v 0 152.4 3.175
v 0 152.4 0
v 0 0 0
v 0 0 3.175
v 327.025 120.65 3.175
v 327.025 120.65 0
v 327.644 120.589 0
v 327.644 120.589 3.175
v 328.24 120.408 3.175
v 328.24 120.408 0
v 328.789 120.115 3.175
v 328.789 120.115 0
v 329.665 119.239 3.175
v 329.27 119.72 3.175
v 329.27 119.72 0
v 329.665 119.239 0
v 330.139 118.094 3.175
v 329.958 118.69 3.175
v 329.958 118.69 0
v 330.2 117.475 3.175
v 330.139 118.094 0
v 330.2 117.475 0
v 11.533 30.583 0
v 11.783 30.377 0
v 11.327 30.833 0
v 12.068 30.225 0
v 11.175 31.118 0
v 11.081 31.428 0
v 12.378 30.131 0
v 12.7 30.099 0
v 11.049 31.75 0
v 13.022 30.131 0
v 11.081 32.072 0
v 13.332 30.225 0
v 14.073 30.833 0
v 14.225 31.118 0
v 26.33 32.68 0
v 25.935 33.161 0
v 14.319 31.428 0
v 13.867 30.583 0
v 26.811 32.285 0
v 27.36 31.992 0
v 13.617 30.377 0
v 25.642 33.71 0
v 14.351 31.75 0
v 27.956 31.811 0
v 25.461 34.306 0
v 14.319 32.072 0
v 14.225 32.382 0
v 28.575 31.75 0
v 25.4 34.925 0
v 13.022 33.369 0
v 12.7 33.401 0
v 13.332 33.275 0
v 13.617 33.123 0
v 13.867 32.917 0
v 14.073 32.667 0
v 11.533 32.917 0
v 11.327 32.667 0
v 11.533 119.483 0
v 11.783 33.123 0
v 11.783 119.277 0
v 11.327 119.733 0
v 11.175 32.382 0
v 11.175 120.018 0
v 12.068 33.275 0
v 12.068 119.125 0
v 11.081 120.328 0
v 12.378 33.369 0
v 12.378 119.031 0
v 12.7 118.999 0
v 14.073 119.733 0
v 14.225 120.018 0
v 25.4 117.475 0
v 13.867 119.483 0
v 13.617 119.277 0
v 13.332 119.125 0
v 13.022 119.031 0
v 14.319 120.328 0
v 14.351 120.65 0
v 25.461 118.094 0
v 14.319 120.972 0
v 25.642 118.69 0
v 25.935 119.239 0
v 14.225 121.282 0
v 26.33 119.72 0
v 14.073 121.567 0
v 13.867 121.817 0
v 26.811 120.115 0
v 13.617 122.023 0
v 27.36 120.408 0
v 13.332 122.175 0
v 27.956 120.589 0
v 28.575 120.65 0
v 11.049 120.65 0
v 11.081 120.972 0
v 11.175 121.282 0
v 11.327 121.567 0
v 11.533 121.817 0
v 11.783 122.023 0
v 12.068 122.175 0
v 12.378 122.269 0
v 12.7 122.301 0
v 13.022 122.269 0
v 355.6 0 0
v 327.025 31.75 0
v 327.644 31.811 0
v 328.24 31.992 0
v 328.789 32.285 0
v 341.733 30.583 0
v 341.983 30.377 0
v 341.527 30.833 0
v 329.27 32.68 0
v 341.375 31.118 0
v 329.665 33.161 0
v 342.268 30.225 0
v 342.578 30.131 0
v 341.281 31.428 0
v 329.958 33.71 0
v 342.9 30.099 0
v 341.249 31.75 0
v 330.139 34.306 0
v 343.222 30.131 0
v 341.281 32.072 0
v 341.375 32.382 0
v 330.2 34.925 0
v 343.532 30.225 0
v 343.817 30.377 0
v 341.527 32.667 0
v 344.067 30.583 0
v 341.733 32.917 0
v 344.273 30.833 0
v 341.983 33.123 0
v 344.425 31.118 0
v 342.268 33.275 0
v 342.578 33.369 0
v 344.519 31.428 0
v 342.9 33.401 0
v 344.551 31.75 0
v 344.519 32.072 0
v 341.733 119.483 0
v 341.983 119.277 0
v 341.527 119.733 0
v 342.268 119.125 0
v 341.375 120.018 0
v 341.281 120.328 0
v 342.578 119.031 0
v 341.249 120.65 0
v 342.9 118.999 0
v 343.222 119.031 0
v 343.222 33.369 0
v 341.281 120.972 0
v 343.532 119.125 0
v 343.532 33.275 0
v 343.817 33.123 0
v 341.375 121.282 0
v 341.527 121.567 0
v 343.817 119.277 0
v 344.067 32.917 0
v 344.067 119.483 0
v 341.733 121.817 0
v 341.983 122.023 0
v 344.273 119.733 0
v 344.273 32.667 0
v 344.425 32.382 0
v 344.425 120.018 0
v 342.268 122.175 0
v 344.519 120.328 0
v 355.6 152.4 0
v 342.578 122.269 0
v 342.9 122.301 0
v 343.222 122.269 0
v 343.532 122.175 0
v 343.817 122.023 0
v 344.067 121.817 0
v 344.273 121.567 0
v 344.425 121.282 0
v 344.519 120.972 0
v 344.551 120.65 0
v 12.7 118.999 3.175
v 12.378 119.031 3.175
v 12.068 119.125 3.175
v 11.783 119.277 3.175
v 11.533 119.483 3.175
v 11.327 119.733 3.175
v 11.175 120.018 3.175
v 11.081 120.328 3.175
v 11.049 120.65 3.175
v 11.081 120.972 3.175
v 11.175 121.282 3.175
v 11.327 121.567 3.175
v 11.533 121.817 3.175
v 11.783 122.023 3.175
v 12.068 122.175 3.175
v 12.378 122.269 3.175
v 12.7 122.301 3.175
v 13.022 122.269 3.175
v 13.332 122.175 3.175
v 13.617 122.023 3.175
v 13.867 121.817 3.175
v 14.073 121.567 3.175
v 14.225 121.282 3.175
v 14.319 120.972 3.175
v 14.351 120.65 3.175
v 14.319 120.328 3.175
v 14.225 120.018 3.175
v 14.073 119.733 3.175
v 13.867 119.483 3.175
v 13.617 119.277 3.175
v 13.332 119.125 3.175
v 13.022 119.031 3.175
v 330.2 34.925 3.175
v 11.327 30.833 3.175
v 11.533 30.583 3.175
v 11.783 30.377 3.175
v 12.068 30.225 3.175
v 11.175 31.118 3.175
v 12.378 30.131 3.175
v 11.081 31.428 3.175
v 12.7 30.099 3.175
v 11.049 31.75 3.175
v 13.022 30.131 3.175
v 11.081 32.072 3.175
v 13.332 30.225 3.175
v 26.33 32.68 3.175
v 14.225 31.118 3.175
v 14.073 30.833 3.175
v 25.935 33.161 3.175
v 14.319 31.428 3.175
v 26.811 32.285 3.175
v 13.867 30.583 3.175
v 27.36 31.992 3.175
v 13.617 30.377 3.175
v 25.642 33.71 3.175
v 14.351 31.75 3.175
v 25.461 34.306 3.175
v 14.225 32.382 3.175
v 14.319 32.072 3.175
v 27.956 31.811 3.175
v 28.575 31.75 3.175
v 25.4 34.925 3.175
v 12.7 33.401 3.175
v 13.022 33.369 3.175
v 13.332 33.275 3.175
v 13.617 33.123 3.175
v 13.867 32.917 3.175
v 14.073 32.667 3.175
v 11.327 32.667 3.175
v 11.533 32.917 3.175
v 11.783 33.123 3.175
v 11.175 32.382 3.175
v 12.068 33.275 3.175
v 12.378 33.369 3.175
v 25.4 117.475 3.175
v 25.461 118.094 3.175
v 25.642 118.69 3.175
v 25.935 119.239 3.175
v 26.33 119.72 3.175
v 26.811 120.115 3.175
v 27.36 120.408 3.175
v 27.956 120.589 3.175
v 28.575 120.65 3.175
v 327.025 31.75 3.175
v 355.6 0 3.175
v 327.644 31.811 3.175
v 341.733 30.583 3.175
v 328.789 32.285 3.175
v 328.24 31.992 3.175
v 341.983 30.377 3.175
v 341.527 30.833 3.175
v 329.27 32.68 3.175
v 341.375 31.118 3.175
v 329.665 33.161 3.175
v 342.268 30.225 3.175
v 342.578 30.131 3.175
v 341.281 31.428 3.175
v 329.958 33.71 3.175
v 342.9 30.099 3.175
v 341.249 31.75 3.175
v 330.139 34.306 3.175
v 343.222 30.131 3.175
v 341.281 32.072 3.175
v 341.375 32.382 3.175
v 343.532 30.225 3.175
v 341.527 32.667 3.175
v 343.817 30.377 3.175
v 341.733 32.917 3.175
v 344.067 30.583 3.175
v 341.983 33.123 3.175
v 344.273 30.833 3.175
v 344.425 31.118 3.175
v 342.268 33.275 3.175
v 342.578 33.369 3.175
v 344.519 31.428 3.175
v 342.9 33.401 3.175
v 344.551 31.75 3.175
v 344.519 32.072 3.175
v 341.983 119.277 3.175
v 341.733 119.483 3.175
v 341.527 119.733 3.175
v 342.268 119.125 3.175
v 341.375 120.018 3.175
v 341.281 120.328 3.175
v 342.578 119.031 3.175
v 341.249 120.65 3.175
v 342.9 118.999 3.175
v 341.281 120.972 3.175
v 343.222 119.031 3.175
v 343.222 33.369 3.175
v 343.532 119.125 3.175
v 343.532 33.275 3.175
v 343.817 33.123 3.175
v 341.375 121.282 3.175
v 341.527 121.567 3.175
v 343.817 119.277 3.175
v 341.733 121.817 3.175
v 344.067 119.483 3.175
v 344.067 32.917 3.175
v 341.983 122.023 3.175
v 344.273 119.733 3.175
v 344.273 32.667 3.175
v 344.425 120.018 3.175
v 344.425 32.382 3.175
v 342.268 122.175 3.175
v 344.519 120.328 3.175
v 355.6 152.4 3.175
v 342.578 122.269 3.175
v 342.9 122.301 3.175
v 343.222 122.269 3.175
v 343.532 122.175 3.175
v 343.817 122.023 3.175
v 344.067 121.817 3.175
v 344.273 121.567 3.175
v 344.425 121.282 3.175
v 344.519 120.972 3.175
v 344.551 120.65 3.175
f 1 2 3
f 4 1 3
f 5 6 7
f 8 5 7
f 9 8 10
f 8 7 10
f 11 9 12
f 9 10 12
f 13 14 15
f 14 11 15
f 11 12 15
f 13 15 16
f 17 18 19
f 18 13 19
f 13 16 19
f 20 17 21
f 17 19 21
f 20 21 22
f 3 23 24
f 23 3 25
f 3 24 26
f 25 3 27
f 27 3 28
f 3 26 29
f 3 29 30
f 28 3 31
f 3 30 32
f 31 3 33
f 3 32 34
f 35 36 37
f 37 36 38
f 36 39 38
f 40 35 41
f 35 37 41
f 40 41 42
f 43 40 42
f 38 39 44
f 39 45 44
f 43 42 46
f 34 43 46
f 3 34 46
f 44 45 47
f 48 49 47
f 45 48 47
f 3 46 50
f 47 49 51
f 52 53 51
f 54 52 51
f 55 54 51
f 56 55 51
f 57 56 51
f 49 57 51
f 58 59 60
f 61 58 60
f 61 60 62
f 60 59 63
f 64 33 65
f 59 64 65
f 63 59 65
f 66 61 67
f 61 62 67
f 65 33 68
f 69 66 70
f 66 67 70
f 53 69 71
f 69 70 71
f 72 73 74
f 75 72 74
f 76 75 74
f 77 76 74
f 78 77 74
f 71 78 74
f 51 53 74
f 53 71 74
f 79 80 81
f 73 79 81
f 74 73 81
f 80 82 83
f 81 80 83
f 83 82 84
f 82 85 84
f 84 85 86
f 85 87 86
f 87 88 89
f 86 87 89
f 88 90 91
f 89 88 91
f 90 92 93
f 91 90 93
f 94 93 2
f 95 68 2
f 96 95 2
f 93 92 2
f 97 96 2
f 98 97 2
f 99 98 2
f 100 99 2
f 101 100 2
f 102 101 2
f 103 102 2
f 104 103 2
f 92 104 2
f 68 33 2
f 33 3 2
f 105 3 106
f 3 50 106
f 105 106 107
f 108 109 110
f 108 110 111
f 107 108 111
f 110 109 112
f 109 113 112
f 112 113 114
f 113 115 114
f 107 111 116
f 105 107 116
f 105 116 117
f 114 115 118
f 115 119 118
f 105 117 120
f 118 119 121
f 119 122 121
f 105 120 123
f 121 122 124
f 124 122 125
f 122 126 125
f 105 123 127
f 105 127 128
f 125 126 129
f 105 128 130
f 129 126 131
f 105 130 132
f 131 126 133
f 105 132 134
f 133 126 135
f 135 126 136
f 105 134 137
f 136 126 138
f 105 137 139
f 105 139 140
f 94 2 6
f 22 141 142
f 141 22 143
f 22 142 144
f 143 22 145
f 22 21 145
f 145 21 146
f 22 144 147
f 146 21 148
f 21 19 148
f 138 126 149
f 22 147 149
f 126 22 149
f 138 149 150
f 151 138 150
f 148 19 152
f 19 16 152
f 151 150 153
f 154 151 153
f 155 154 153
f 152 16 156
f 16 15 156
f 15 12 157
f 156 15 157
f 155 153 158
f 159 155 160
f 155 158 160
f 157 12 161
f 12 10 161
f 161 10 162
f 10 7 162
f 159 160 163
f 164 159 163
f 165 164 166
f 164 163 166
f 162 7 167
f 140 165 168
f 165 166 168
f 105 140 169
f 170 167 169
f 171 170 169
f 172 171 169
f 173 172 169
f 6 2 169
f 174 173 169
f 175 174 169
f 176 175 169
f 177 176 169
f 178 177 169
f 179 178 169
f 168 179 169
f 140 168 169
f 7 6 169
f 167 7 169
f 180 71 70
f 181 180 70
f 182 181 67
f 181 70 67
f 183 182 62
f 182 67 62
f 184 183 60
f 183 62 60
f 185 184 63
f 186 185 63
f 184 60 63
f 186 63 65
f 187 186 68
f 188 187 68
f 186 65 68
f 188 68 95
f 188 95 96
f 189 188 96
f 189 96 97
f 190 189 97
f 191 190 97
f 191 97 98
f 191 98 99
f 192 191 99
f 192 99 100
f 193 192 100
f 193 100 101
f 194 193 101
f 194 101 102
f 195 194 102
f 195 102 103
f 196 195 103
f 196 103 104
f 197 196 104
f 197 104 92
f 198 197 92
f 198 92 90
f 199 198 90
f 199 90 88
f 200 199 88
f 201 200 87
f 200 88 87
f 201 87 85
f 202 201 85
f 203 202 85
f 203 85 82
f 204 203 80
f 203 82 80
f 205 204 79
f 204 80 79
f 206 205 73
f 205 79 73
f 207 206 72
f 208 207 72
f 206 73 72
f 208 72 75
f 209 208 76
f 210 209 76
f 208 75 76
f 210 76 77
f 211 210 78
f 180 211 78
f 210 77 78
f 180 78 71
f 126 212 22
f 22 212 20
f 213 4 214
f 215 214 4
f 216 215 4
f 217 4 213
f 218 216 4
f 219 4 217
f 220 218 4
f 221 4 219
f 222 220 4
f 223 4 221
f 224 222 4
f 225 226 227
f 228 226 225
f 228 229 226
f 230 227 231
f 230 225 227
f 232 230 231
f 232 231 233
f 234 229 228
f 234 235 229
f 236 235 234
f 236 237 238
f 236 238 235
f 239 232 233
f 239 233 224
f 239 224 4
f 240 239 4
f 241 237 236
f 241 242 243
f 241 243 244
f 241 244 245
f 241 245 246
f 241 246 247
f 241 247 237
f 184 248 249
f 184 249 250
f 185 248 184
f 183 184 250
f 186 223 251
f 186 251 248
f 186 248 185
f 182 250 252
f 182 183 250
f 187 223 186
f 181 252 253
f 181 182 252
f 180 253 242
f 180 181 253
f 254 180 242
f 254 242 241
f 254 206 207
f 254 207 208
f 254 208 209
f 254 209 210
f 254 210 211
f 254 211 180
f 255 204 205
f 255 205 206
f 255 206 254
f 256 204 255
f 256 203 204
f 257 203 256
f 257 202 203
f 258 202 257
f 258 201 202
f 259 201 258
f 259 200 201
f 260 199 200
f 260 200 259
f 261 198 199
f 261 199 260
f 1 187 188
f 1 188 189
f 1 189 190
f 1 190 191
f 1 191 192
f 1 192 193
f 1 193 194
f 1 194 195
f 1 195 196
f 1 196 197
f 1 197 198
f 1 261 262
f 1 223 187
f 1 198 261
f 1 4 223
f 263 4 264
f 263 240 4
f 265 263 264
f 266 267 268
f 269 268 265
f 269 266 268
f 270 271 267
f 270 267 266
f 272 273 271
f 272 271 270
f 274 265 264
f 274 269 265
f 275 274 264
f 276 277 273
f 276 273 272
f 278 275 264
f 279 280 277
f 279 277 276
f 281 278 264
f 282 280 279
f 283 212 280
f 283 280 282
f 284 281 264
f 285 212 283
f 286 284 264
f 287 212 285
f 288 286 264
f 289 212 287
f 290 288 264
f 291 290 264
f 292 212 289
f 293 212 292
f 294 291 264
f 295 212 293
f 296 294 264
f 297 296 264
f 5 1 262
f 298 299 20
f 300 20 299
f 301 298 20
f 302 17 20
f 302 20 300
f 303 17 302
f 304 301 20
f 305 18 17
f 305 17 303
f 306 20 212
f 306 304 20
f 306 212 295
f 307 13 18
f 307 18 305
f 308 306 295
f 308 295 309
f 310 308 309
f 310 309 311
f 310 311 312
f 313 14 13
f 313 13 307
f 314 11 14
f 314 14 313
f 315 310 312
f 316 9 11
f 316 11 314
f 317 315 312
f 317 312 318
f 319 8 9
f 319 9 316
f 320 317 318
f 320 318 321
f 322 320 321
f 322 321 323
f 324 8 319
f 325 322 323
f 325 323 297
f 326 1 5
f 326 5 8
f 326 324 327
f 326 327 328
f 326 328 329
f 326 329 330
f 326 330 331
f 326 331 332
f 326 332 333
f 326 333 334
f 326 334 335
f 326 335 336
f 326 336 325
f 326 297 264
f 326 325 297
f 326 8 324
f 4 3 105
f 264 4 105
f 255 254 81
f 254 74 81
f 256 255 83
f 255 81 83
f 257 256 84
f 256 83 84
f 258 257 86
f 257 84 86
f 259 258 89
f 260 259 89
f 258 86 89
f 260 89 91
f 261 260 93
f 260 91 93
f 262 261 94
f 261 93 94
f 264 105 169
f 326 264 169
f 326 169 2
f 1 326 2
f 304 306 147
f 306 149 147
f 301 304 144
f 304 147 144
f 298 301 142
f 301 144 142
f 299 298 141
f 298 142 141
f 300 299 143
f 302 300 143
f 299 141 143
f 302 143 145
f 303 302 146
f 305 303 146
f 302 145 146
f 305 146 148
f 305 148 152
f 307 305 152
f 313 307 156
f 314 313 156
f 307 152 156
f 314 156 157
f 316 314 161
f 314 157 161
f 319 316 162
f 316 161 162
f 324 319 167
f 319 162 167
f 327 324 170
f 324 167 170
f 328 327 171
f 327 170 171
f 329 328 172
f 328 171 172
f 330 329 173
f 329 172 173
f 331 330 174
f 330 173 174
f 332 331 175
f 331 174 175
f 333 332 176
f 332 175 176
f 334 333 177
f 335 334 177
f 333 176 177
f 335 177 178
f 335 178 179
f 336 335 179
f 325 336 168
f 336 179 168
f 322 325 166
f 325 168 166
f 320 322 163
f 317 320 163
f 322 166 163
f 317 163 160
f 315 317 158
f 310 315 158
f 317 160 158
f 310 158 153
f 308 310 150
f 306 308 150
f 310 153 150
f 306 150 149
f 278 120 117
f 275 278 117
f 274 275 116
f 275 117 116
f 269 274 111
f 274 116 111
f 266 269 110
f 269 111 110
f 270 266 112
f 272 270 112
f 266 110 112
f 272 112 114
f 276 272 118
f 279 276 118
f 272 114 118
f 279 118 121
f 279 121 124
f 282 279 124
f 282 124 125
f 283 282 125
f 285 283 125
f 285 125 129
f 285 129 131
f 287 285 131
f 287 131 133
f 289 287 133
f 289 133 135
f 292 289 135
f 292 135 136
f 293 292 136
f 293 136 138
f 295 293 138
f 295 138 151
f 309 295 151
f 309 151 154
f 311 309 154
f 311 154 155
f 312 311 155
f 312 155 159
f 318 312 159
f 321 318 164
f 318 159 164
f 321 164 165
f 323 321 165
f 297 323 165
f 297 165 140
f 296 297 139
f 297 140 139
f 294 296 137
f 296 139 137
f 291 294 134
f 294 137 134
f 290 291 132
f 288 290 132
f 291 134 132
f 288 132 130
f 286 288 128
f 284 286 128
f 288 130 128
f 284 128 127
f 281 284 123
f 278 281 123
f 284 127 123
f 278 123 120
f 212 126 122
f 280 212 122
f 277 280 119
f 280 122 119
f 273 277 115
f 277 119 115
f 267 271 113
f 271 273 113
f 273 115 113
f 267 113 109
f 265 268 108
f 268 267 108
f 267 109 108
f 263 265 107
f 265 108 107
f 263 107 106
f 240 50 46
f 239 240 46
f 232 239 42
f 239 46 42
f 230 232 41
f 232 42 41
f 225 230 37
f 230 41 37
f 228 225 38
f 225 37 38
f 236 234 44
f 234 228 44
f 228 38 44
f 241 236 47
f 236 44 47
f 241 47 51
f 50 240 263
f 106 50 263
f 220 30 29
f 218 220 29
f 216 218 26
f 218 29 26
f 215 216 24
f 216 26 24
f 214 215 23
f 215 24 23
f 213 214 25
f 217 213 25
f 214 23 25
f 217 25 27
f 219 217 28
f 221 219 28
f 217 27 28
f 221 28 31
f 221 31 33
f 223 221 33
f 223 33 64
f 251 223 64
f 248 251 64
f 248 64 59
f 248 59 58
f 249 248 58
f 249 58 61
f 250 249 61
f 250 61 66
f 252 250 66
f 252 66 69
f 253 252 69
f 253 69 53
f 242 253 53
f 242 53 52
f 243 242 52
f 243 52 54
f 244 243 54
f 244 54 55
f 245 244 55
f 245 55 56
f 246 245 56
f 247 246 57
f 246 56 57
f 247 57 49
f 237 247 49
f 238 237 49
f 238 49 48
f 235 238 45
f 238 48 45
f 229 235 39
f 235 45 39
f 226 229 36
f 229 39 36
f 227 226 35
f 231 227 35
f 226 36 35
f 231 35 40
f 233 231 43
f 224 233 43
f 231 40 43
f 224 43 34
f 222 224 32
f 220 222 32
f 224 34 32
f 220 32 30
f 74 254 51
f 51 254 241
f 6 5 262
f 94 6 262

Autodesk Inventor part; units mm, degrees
ref_plane "YZ Plane" through (0, 0, 0) normal (1, 0, 0) x (0, 1, 0)
ref_plane "XZ Plane" through (0, 0, 0) normal (0, 1, 0) x (-1, 0, 0)
ref_plane "XY Plane" through (0, 0, 0) normal (0, 0, 1) x (1, 0, 0)
sketch "Sketch1" plane through (0, 0, 0) normal (0, 0, 1) x (1, 0, 0)
  line L0 (0, 0) -> (355.6, 0)
  line L1 (355.6, 0) -> (355.6, 152.4)
  line L2 (355.6, 152.4) -> (0, 152.4)
  line L3 (0, 152.4) -> (0, 0)
  dimension "d0" = 152.4
  dimension "d1" = 355.6
extrude "Extrusion1" add sketch "Sketch1" along normal blind 3.175
sketch "Sketch2" plane through (0, 0, 3.175) normal (0, 0, 1) x (1, 0, 0)
  line L0 (355.6, 0) -> (355.6, 152.4) projected
  line L1 (0, 152.4) -> (0, 0) projected
  line L2 (355.6, 152.4) -> (0, 152.4) projected
  line L3 (0, 0) -> (355.6, 0) projected
  point P0 (12.7, 31.75)
  point P1 (12.7, 120.65)
  point P2 (342.9, 120.65)
  point P3 (342.9, 31.75)
  dimension "d4" = 12.7
  dimension "d5" = 12.7
  dimension "d6" = 12.7
  dimension "d7" = 12.7
  dimension "d8" = 31.75
  dimension "d9" = 31.75
  dimension "d10" = 31.75
  dimension "d11" = 31.75
hole "Hole1" at (12.7, 31.75, 3.175) at (12.7, 120.65, 3.175) at (342.9, 120.65, 3.175) at (342.9, 31.75, 3.175) direction (0, 0, -1) diameter 3.302 end through all thread size "8-32 UNC" class "2B" standard "ANSI Unified Screw Threads"
sketch "Sketch3" plane through (0, 0, 3.175) normal (0, 0, 1) x (1, 0, 0)
  line L0 (25.4, 31.75) -> (330.2, 31.75)
  line L1 (330.2, 31.75) -> (330.2, 120.65)
  line L2 (330.2, 120.65) -> (25.4, 120.65)
  line L3 (25.4, 120.65) -> (25.4, 31.75)
  line L4 (0, 152.4) -> (0, 0) projected
  circle A0 centre (342.9, 120.65) radius 1.651 projected
  circle A1 centre (12.7, 31.75) radius 1.651 projected
  circle A2 centre (12.7, 120.65) radius 1.651 projected
  circle A3 centre (342.9, 31.75) radius 1.651 projected
  line L5 (0, 0) -> (355.6, 0) projected
  line L6 (355.6, 0) -> (355.6, 152.4) projected
  line L7 (355.6, 152.4) -> (0, 152.4) projected
  line L8 (0, 152.4) -> (0, 0) projected
  dimension "d27" = 25.4
  dimension "d28" = 304.8
  dimension "d29" = 31.75
  dimension "d30" = 88.9
extrude "Extrusion2" cut sketch "Sketch3" against normal blind 3.175 contours L3 L2 L1 L0
fillet "Fillet1" radius 3.175 4 edges at (25.4, 31.75, 1.5875) (25.4, 120.65, 1.5875) (330.2, 120.65, 1.5875) (330.2, 31.75, 1.5875)
equation "\"d5\" = d4"
equation "\"d6\" = d4"
equation "\"d7\" = d4"
equation "\"d9\" = d8"
equation "\"d10\" = d8"
equation "\"d11\" = d8"
properties part number "LFEV2017_TSI_003"
